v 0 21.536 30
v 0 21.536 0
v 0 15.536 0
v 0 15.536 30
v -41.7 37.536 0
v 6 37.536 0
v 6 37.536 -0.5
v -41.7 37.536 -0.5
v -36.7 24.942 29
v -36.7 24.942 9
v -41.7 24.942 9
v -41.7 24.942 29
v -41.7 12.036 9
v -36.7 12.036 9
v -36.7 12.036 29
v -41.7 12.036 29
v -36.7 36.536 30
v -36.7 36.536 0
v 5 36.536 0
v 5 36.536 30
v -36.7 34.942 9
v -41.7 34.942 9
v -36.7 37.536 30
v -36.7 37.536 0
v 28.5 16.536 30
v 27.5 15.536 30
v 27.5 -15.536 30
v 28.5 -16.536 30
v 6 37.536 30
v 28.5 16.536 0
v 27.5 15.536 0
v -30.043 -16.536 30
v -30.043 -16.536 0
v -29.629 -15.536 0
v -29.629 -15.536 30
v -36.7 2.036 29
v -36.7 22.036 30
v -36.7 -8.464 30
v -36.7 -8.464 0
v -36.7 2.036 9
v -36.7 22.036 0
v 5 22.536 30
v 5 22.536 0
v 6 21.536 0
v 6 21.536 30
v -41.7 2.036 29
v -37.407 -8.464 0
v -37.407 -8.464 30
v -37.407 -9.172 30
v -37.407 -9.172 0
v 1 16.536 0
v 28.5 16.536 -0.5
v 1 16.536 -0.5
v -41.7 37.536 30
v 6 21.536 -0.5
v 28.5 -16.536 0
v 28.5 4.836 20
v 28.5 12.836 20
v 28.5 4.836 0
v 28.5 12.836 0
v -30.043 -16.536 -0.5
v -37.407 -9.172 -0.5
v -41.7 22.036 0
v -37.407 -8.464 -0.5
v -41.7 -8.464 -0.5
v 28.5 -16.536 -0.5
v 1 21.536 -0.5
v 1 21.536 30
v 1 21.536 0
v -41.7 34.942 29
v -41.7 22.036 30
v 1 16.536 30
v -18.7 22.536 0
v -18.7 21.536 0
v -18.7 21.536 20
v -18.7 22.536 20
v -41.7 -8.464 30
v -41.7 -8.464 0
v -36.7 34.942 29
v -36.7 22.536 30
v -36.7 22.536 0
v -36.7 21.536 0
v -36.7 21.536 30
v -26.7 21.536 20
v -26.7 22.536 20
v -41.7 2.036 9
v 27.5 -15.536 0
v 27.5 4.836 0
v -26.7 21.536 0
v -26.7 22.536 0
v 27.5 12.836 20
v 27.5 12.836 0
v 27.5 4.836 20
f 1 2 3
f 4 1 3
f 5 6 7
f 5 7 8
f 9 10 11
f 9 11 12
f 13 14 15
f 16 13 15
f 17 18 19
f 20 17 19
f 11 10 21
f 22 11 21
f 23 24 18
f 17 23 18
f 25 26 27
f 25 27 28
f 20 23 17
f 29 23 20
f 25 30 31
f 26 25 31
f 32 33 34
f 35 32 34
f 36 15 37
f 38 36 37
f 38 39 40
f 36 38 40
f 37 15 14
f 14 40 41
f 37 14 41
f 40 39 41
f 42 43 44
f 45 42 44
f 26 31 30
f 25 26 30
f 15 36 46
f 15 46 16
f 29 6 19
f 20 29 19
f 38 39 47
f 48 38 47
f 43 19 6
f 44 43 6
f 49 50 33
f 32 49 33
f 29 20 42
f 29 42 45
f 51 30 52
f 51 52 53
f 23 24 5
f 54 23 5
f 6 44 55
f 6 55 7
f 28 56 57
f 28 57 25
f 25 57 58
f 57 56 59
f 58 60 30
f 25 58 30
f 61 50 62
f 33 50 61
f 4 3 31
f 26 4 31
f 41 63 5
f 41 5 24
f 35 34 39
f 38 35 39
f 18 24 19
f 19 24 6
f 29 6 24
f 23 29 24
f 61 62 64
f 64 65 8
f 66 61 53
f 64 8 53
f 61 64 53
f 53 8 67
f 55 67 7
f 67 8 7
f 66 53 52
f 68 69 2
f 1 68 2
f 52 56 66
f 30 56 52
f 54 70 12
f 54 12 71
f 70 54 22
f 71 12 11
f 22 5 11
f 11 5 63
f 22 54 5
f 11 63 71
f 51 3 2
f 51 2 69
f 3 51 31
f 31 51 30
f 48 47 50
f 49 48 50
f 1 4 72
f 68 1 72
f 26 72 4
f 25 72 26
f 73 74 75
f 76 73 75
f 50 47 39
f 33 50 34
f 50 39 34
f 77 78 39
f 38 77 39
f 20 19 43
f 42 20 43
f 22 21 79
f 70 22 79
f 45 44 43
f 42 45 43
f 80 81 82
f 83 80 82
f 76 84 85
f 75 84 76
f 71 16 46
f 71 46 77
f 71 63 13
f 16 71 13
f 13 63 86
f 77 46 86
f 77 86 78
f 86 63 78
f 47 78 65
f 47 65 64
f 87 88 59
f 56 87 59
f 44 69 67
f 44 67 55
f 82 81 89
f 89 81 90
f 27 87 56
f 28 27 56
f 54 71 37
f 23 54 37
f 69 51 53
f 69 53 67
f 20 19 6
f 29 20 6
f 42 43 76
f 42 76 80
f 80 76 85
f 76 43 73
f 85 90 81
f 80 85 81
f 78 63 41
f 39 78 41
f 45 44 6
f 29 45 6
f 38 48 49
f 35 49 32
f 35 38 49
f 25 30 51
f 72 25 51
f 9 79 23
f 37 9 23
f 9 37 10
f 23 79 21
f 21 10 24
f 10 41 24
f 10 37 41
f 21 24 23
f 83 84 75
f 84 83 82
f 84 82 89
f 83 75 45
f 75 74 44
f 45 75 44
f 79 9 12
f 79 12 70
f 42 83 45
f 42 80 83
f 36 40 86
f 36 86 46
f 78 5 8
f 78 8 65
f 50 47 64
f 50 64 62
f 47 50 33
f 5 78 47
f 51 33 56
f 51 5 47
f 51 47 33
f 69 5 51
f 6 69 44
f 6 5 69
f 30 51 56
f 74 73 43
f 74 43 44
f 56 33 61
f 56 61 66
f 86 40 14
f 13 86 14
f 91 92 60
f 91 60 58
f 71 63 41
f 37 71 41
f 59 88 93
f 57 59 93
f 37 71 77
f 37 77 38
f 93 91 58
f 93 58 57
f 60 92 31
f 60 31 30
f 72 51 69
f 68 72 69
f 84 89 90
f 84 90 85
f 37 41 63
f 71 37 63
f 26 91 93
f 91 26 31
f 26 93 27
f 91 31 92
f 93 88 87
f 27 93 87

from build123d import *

# Parameters (mm, degrees)
F0_W      = 41.7
F0_H      = 14
F1_DEPTH  = 0.5
F2_DEPTH  = 30
F3_W      = 10
F3_H      = 20
F4_DEPTH  = 5
F5_DEPTH  = 30
F6_W      = 10
F6_H      = 20
F7_DEPTH  = 5
F8_DEPTH  = 30
F9_DEPTH  = 30
F10_DEPTH = 30
F11_W     = 8
F11_H     = 20
F12_DEPTH = 1
F13_DEPTH = 30
F14_DEPTH = 30
F16_DEPTH = 30
F15_W     = 8
F15_H     = 20
F17_DEPTH = 1


with BuildPart() as f1:
    # F0 (on Top) → F1 (new body)
    with BuildSketch(Plane.XY):
        Polygon((-37.407107, -8.464466), (-36.7, -8.464466), (-36.7, 21.535534), (-36.7, 22.035534), (-41.7, 22.035534), (-41.7, -8.464466), align=None)
        Polygon((-29.628932, -15.535534), (-36.7, -8.464466), (-37.407107, -8.464466), (-37.407107, -9.171573), (-30.043146, -16.535534), align=None)
        Polygon((-36.7, 22.035534), (-36.7, 21.535534), (0, 21.535534), (1, 21.535534), (5, 21.535534), (6, 21.535534), (5, 22.535534), (-36.7, 22.535534), align=None)
        Polygon((0, -15.535534), (-29.628932, -15.535534), (-30.043146, -16.535534), (0, -16.535534), align=None)
        Polygon((1, 21.535534), (0, 21.535534), (0, 15.535534), (27.5, 15.535534), (28.5, 16.535534), (1, 16.535534), align=None)
        Polygon((-41.7, 22.035534), (-36.7, 22.035534), (-36.7, 22.535534), (-36.7, 36.535534), (-36.7, 37.535534), (-41.7, 37.535534), align=None)
        Polygon((27.5, -15.535534), (0, -15.535534), (0, -16.535534), (28.5, -16.535534), align=None)
        Polygon((27.5, 15.535534), (27.5, -15.535534), (28.5, -16.535534), (28.5, 16.535534), align=None)
        Polygon((-36.7, 37.535534), (-36.7, 36.535534), (5, 36.535534), (6, 37.535534), align=None)
        Polygon((5, 36.535534), (5, 22.535534), (6, 21.535534), (6, 37.535534), align=None)
        Polygon((-36.7, 21.535534), (-36.7, -8.464466), (-29.628932, -15.535534), (0, -15.535534), (27.5, -15.535534), (27.5, 15.535534), (0, 15.535534), (0, 21.535534), align=None)
        with Locations((-15.85, 29.535534)):
            Rectangle(F0_W, F0_H)
    extrude(amount=-F1_DEPTH)


with BuildPart() as f2:
    # F0 (on Top) → F2 (new body)
    with BuildSketch(Plane.XY):
        Polygon((-37.407107, -8.464466), (-36.7, -8.464466), (-36.7, 21.535534), (-36.7, 22.035534), (-41.7, 22.035534), (-41.7, -8.464466), align=None)
    extrude(amount=F2_DEPTH)

    # F3 (on face) → F4 (cut, through all)
    with BuildSketch(Plane.YZ.offset(-36.7)):
        with Locations((7.035534, 19)):
            Rectangle(F3_W, F3_H)
    extrude(amount=-F4_DEPTH, mode=Mode.SUBTRACT)


with BuildPart() as f5:
    # F0 (on Top) → F5 (new body)
    with BuildSketch(Plane.XY):
        Polygon((-41.7, 22.035534), (-36.7, 22.035534), (-36.7, 22.535534), (-36.7, 36.535534), (-36.7, 37.535534), (-41.7, 37.535534), align=None)
    extrude(amount=F5_DEPTH)

    # F6 (on face) → F7 (cut, through all)
    with BuildSketch(Plane.YZ.offset(-36.7)):
        with Locations((29.942042, 19)):
            Rectangle(F6_W, F6_H)
    extrude(amount=-F7_DEPTH, mode=Mode.SUBTRACT)


with BuildPart() as f8:
    # F0 (on Top) → F8 (new body)
    with BuildSketch(Plane.XY):
        Polygon((-36.7, 37.535534), (-36.7, 36.535534), (5, 36.535534), (6, 37.535534), align=None)
    extrude(amount=F8_DEPTH)


with BuildPart() as f9:
    # F0 (on Top) → F9 (new body)
    with BuildSketch(Plane.XY):
        Polygon((5, 36.535534), (5, 22.535534), (6, 21.535534), (6, 37.535534), align=None)
    extrude(amount=F9_DEPTH)


with BuildPart() as f10:
    # F0 (on Top) → F10 (new body)
    with BuildSketch(Plane.XY):
        Polygon((-36.7, 22.035534), (-36.7, 21.535534), (0, 21.535534), (1, 21.535534), (5, 21.535534), (6, 21.535534), (5, 22.535534), (-36.7, 22.535534), align=None)
    extrude(amount=F10_DEPTH)

    # F11 (on face) → F12 (cut, through all)
    with BuildSketch(Plane.XZ.offset(-21.535534)):
        with Locations((-22.7, 10)):
            Rectangle(F11_W, F11_H)
    extrude(amount=-F12_DEPTH, mode=Mode.SUBTRACT)


with BuildPart() as f13:
    # F0 (on Top) → F13 (new body)
    with BuildSketch(Plane.XY):
        Polygon((1, 21.535534), (0, 21.535534), (0, 15.535534), (27.5, 15.535534), (28.5, 16.535534), (1, 16.535534), align=None)
    extrude(amount=F13_DEPTH)


with BuildPart() as f14:
    # F0 (on Top) → F14 (new body)
    with BuildSketch(Plane.XY):
        Polygon((27.5, 15.535534), (27.5, -15.535534), (28.5, -16.535534), (28.5, 16.535534), align=None)
    extrude(amount=F14_DEPTH)

    # F15 (on face) → F17 (cut, through all)
    with BuildSketch(Plane(origin=(27.5, 0, 0), x_dir=(0, -1, 0), z_dir=(-1, 0, 0))):
        with Locations((-8.835534, 10)):
            Rectangle(F15_W, F15_H)
    extrude(amount=-F17_DEPTH, mode=Mode.SUBTRACT)


with BuildPart() as f16:
    # F0 (on Top) → F16 (new body)
    with BuildSketch(Plane.XY):
        Polygon((-29.628932, -15.535534), (-36.7, -8.464466), (-37.407107, -8.464466), (-37.407107, -9.171573), (-30.043146, -16.535534), align=None)
    extrude(amount=F16_DEPTH)


solid = Compound([f1.part, f2.part, f5.part, f8.part, f9.part, f10.part, f13.part, f14.part, f16.part])
